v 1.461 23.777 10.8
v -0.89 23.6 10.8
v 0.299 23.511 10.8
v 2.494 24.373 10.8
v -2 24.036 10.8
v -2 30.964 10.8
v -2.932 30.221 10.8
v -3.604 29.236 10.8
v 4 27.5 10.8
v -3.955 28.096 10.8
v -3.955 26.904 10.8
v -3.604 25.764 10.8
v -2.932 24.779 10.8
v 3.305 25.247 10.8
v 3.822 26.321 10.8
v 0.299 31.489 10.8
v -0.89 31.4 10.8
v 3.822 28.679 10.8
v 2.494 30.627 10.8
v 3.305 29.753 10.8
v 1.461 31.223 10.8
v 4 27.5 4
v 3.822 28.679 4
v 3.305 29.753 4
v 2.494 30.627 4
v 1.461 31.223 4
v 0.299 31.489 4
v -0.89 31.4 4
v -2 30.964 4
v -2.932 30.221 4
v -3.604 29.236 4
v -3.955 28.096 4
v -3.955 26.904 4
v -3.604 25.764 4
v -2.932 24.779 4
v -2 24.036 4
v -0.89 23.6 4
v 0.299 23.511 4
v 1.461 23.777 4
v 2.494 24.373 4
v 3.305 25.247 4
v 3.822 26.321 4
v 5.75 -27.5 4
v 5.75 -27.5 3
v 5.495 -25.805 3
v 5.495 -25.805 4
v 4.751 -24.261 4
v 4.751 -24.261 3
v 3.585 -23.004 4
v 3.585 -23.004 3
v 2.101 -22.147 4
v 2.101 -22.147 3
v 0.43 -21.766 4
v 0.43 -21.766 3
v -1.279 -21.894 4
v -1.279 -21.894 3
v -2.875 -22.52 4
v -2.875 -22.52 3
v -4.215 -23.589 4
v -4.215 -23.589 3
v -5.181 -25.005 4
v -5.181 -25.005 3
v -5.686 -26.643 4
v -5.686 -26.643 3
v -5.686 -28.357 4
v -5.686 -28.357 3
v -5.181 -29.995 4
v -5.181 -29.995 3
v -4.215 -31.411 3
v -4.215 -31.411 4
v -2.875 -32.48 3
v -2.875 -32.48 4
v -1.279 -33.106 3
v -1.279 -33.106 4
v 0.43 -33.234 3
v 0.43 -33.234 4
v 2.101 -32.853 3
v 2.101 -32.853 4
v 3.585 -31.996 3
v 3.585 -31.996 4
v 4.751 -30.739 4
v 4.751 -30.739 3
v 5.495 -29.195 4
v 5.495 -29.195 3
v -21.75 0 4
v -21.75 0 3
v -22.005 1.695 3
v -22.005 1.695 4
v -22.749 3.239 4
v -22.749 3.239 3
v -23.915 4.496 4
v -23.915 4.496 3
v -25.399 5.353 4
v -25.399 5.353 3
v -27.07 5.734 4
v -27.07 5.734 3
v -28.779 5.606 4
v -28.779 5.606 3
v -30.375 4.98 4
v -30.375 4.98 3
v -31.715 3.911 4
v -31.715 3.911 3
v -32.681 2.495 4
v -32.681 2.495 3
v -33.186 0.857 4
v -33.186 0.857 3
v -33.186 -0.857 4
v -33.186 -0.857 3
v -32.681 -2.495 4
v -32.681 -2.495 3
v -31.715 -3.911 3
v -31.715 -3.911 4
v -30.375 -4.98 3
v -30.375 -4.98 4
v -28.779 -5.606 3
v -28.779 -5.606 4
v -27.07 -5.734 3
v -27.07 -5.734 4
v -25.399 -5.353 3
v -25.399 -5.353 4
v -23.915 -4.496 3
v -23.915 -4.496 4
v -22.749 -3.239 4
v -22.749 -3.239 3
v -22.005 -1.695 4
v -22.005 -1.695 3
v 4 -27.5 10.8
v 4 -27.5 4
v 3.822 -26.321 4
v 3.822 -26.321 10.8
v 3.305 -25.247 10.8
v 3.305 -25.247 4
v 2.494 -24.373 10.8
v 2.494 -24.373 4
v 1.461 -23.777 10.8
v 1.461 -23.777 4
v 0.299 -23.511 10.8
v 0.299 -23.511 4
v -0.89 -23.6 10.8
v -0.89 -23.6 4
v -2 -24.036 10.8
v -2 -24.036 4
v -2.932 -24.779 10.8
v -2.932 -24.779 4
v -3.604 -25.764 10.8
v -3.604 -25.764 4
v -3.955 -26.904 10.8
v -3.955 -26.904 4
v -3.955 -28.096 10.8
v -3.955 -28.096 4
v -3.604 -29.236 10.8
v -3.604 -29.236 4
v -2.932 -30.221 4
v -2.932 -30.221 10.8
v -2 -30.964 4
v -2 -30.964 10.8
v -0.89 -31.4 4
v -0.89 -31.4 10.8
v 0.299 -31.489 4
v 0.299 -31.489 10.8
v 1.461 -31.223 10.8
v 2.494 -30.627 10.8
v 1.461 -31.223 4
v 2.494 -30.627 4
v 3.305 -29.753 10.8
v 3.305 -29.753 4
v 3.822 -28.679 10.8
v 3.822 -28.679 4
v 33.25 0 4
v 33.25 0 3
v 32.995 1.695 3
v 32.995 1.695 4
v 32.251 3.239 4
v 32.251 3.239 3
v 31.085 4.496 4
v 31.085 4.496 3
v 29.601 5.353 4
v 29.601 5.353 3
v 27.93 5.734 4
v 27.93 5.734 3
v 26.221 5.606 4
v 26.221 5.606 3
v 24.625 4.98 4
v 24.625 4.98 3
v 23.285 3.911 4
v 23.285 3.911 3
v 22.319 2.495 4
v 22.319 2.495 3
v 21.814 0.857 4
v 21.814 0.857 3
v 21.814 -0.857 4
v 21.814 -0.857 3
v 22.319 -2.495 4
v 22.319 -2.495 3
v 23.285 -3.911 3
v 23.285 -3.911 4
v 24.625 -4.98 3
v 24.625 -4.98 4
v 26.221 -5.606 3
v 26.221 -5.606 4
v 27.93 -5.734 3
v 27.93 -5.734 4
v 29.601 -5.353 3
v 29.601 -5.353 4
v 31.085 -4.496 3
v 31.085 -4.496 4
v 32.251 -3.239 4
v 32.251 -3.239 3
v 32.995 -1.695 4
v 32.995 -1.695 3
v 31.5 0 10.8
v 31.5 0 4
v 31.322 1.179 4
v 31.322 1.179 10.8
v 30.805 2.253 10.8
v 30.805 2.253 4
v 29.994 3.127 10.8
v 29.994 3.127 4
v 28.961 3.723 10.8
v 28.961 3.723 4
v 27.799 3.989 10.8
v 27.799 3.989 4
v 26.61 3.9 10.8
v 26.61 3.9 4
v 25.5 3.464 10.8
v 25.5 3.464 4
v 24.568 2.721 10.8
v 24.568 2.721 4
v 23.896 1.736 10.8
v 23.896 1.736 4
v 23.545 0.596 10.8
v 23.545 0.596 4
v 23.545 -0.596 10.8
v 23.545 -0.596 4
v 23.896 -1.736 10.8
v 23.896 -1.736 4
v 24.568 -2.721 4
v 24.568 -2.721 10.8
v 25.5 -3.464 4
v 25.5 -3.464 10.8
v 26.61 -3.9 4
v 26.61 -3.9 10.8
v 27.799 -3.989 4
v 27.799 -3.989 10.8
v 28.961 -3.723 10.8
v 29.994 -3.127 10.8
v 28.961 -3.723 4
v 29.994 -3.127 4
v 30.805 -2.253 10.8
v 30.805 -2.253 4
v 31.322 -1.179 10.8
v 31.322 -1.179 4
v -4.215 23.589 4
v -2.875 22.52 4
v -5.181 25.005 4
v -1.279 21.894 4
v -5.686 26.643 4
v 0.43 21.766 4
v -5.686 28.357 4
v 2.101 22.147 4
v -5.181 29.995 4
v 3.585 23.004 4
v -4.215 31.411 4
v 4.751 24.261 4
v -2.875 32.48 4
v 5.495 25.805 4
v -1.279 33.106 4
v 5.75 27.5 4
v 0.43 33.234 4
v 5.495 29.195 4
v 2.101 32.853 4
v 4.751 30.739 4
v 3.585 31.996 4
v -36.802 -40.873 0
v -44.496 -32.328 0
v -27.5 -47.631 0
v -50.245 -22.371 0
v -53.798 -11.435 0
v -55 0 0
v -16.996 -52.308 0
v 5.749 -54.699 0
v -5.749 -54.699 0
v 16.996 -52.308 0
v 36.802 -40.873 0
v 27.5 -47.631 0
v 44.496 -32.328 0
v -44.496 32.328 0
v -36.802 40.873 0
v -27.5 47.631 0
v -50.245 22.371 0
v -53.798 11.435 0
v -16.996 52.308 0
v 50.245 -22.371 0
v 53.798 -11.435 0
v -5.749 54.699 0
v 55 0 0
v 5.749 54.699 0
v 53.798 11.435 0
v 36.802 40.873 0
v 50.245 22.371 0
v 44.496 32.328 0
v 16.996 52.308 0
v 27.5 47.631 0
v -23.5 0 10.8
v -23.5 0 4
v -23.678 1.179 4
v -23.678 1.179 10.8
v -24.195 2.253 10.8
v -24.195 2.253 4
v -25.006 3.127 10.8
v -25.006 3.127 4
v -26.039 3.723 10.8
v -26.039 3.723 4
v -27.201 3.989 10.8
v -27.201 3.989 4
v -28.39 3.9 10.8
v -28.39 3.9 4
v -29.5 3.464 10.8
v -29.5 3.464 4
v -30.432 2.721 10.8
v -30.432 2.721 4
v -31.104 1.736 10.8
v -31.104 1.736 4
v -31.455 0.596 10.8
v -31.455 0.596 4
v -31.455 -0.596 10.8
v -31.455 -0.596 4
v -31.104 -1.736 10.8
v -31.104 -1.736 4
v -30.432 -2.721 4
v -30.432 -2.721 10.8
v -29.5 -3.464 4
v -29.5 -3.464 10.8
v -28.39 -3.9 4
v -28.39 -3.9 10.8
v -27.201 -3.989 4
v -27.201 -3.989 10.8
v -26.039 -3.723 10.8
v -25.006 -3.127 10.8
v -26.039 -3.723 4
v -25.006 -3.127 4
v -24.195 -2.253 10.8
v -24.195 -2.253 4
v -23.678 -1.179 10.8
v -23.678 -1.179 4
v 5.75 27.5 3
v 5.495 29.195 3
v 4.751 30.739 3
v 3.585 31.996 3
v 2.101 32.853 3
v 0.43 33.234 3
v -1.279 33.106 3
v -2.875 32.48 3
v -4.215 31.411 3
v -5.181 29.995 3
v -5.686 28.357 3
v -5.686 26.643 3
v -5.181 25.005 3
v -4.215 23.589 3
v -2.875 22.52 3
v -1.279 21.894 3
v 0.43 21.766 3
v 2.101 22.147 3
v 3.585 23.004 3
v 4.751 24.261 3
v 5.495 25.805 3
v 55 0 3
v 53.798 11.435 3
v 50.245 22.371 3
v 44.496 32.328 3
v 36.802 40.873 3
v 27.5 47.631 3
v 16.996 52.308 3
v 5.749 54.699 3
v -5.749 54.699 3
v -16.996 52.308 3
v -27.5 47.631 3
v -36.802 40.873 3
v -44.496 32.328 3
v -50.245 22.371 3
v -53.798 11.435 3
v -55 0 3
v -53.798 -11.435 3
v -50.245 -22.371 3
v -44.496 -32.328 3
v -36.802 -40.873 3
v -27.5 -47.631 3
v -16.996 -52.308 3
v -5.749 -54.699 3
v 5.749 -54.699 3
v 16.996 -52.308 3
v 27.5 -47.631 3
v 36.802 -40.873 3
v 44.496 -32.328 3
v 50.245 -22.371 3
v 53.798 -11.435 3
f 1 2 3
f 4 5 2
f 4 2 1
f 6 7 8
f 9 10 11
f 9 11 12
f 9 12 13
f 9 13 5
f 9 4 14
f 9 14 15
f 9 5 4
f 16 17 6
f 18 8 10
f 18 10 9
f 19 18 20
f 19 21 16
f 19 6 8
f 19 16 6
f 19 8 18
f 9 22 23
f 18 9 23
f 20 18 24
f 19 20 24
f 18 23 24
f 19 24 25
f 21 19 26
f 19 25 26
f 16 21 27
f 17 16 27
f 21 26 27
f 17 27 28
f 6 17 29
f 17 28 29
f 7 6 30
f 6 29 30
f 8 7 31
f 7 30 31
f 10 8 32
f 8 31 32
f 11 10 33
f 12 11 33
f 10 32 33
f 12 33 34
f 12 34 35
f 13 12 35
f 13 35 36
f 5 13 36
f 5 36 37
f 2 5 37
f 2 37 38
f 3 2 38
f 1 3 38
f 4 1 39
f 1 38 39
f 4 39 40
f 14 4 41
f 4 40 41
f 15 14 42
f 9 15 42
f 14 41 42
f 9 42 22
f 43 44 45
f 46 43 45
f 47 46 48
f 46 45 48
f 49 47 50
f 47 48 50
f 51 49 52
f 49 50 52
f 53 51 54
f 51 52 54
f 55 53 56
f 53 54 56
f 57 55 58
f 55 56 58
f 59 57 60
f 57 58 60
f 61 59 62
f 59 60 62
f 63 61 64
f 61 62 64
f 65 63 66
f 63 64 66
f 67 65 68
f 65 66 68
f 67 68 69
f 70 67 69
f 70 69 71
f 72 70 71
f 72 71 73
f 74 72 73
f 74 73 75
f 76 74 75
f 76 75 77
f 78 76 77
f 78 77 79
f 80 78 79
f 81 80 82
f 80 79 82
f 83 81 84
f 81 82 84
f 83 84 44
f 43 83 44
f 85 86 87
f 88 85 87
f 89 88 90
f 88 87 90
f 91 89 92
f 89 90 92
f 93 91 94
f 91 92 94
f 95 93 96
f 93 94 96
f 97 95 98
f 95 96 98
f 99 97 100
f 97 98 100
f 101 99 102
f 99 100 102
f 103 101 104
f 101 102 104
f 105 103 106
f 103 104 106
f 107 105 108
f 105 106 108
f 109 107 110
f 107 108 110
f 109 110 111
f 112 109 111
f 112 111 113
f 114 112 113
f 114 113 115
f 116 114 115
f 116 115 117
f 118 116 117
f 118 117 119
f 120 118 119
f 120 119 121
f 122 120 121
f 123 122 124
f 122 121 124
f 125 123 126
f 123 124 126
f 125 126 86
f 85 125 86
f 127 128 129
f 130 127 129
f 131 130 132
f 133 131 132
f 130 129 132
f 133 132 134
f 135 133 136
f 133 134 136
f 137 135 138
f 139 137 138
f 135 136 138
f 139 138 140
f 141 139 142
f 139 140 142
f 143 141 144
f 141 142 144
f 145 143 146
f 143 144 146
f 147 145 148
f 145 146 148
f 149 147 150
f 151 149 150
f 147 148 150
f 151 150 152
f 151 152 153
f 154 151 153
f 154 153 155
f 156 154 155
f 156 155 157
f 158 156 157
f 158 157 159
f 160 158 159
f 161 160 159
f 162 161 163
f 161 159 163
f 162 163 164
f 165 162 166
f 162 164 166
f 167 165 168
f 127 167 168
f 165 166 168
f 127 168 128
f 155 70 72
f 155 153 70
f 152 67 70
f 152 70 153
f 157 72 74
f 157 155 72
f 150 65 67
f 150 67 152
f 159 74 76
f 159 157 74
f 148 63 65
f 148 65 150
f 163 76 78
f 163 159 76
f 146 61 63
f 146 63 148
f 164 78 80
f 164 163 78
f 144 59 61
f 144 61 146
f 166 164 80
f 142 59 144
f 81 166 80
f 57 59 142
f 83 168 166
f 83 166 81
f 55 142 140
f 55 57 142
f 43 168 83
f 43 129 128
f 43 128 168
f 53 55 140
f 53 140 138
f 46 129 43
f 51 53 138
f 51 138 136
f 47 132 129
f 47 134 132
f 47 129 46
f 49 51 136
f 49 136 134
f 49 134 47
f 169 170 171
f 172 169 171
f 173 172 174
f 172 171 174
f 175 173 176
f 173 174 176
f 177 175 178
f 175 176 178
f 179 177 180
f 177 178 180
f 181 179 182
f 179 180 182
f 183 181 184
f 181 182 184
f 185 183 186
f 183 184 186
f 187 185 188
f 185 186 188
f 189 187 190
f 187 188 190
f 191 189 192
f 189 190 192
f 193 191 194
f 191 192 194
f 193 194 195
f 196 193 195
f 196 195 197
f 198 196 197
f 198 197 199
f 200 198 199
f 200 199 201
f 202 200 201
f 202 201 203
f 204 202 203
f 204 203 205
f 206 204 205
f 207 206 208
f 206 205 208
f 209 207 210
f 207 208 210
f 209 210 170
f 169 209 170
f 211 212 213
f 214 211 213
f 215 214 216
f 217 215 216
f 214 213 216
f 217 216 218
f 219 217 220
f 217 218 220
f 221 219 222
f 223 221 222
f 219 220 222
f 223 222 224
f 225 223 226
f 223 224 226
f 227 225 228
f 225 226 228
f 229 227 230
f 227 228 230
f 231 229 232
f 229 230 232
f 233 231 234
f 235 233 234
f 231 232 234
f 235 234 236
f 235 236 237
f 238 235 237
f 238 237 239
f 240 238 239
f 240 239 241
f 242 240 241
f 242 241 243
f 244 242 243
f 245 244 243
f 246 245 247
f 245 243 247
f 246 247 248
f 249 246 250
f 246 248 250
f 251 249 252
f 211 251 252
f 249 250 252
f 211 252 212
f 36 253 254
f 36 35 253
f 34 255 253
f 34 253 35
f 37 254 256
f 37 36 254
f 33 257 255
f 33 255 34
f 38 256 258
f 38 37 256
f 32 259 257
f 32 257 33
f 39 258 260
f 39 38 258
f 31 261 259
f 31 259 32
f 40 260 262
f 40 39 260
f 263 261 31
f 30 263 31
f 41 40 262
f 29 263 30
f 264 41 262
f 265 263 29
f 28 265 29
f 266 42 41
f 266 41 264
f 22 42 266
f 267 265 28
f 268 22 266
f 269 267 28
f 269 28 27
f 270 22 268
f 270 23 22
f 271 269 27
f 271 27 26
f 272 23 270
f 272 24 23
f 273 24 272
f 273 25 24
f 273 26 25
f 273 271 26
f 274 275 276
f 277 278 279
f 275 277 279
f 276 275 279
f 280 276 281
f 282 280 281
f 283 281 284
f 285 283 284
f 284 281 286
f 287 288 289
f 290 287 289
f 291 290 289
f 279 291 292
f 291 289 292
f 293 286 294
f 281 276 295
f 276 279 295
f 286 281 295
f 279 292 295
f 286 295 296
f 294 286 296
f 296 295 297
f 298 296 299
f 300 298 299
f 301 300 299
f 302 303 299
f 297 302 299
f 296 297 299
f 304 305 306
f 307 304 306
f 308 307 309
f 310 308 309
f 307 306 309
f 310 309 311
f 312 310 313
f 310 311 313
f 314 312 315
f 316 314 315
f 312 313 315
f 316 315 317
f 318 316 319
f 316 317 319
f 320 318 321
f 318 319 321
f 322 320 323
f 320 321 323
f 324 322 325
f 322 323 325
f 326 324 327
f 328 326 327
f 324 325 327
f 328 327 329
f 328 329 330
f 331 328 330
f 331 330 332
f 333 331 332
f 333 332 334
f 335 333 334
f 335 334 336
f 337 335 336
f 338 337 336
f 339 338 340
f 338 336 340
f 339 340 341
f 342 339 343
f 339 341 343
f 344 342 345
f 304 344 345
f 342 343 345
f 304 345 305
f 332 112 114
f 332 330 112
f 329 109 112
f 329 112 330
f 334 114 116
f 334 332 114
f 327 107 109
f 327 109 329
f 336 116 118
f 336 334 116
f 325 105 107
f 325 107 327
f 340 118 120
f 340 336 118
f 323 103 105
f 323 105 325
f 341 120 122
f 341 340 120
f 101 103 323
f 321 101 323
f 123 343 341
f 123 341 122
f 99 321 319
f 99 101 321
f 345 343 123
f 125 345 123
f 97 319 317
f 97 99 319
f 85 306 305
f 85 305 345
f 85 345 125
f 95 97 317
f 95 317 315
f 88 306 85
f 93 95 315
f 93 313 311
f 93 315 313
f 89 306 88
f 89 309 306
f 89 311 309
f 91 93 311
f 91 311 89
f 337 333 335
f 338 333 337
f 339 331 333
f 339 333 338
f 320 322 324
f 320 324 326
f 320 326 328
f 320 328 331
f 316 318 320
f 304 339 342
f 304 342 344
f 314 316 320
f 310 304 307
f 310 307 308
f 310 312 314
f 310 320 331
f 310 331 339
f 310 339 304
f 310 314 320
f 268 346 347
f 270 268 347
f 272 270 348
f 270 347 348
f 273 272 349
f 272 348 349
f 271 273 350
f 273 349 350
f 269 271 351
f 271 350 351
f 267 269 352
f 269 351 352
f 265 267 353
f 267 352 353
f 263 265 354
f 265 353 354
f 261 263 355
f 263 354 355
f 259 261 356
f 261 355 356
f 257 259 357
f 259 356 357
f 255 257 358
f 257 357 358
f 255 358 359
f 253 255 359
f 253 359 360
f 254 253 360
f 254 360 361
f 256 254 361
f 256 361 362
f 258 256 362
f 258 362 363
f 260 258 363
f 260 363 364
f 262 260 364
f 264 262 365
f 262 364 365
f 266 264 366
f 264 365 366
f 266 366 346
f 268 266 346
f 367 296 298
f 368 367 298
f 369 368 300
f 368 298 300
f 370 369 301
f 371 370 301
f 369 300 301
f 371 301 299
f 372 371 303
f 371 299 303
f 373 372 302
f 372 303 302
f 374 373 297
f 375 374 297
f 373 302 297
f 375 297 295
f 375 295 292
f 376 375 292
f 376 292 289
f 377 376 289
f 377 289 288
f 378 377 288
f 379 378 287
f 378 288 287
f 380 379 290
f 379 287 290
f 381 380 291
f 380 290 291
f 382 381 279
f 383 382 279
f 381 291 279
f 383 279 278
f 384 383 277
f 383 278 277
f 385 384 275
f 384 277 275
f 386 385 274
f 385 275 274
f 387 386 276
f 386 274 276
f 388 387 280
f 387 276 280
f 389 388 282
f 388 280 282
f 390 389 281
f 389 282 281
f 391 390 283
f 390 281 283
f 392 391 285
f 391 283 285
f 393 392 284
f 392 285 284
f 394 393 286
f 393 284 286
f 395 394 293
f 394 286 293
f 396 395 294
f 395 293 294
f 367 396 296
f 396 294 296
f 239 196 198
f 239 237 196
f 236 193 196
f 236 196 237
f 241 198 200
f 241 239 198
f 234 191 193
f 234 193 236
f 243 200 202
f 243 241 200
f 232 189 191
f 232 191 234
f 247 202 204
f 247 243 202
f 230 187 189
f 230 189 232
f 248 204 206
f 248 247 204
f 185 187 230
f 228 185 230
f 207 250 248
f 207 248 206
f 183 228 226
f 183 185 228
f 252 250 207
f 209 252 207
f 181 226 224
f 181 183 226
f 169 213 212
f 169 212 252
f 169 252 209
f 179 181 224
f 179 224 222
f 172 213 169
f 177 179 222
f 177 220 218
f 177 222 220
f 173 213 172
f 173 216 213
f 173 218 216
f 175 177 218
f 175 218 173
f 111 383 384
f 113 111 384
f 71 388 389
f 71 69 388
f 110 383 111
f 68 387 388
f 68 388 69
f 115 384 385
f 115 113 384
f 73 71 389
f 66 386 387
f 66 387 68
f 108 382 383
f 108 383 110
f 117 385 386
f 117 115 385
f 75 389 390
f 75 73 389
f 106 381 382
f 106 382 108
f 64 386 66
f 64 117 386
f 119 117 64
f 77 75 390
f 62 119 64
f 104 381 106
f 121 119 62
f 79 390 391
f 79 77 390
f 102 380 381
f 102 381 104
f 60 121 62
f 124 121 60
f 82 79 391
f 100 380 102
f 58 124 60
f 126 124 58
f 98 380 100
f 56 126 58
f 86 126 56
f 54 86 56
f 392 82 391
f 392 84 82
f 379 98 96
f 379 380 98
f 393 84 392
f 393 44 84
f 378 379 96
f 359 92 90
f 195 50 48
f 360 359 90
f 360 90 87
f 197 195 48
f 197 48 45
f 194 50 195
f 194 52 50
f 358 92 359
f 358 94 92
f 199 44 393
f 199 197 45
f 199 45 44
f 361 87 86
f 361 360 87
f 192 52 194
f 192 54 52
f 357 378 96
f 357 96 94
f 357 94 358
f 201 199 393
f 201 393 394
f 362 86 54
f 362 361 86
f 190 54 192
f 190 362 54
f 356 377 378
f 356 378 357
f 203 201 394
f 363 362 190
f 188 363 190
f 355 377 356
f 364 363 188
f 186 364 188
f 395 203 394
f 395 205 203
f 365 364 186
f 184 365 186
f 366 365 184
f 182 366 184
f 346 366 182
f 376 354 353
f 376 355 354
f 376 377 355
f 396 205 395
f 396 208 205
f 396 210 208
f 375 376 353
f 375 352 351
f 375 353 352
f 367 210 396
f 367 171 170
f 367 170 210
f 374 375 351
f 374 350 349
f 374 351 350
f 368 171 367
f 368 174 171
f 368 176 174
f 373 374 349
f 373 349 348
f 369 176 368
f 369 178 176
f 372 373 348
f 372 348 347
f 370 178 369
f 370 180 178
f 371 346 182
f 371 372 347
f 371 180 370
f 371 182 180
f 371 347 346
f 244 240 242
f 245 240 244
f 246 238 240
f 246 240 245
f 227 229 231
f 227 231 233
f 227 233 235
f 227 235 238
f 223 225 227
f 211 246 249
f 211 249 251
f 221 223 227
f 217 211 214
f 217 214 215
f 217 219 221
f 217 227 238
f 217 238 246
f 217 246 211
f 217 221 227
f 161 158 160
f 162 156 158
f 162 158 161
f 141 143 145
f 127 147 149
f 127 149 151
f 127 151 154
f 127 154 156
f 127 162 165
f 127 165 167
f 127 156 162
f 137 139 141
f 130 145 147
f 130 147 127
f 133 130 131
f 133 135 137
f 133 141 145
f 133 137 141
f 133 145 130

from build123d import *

# Parameters (mm, degrees)
F0_R      = 55
F1_DEPTH  = 3
F2_R      = 5.75
F3_DEPTH  = 1
F5_R      = 4
F6_DEPTH  = 6.8
F4_R      = 4
F7_DEPTH  = 6.8
F8_R      = 4
F9_DEPTH  = 6.8
F10_R     = 4
F11_DEPTH = 6.8


# Not quite as in the source:
# - a feature of the source that left no trace in its solid (it failed there, or was rolled back) is left out


with BuildPart() as f1:
    # F0 (on Top) → F1 (new body)
    with BuildSketch(Plane.XY):
        Circle(F0_R)
    extrude(amount=F1_DEPTH)

    # F2 (on face) → F3 (join)
    with BuildSketch(Plane.XY.offset(3)):
        with Locations((-27.5, 0)):
            Circle(F2_R)
        with Locations((27.5, 0)):
            Circle(F2_R)
        with Locations((0, 27.5)):
            Circle(F2_R)
        with Locations((0, -27.5)):
            Circle(F2_R)
    extrude(amount=F3_DEPTH)

    # F5 (on face) → F6 (join)
    with BuildSketch(Plane.XY.offset(4)):
        with Locations((27.5, 0)):
            Circle(F5_R)
    extrude(amount=F6_DEPTH)

    # F4 (on face) → F7 (join)
    with BuildSketch(Plane.XY.offset(4)):
        with Locations((-27.5, 0)):
            Circle(F4_R)
    extrude(amount=F7_DEPTH)

    # F8 (on face) → F9 (join)
    with BuildSketch(Plane.XY.offset(4)):
        with Locations((0, 27.5)):
            Circle(F8_R)
    extrude(amount=F9_DEPTH)

    # F10 (on face) → F11 (join)
    with BuildSketch(Plane.XY.offset(4)):
        with Locations((0, -27.5)):
            Circle(F10_R)
    extrude(amount=F11_DEPTH)


solid = f1.part
